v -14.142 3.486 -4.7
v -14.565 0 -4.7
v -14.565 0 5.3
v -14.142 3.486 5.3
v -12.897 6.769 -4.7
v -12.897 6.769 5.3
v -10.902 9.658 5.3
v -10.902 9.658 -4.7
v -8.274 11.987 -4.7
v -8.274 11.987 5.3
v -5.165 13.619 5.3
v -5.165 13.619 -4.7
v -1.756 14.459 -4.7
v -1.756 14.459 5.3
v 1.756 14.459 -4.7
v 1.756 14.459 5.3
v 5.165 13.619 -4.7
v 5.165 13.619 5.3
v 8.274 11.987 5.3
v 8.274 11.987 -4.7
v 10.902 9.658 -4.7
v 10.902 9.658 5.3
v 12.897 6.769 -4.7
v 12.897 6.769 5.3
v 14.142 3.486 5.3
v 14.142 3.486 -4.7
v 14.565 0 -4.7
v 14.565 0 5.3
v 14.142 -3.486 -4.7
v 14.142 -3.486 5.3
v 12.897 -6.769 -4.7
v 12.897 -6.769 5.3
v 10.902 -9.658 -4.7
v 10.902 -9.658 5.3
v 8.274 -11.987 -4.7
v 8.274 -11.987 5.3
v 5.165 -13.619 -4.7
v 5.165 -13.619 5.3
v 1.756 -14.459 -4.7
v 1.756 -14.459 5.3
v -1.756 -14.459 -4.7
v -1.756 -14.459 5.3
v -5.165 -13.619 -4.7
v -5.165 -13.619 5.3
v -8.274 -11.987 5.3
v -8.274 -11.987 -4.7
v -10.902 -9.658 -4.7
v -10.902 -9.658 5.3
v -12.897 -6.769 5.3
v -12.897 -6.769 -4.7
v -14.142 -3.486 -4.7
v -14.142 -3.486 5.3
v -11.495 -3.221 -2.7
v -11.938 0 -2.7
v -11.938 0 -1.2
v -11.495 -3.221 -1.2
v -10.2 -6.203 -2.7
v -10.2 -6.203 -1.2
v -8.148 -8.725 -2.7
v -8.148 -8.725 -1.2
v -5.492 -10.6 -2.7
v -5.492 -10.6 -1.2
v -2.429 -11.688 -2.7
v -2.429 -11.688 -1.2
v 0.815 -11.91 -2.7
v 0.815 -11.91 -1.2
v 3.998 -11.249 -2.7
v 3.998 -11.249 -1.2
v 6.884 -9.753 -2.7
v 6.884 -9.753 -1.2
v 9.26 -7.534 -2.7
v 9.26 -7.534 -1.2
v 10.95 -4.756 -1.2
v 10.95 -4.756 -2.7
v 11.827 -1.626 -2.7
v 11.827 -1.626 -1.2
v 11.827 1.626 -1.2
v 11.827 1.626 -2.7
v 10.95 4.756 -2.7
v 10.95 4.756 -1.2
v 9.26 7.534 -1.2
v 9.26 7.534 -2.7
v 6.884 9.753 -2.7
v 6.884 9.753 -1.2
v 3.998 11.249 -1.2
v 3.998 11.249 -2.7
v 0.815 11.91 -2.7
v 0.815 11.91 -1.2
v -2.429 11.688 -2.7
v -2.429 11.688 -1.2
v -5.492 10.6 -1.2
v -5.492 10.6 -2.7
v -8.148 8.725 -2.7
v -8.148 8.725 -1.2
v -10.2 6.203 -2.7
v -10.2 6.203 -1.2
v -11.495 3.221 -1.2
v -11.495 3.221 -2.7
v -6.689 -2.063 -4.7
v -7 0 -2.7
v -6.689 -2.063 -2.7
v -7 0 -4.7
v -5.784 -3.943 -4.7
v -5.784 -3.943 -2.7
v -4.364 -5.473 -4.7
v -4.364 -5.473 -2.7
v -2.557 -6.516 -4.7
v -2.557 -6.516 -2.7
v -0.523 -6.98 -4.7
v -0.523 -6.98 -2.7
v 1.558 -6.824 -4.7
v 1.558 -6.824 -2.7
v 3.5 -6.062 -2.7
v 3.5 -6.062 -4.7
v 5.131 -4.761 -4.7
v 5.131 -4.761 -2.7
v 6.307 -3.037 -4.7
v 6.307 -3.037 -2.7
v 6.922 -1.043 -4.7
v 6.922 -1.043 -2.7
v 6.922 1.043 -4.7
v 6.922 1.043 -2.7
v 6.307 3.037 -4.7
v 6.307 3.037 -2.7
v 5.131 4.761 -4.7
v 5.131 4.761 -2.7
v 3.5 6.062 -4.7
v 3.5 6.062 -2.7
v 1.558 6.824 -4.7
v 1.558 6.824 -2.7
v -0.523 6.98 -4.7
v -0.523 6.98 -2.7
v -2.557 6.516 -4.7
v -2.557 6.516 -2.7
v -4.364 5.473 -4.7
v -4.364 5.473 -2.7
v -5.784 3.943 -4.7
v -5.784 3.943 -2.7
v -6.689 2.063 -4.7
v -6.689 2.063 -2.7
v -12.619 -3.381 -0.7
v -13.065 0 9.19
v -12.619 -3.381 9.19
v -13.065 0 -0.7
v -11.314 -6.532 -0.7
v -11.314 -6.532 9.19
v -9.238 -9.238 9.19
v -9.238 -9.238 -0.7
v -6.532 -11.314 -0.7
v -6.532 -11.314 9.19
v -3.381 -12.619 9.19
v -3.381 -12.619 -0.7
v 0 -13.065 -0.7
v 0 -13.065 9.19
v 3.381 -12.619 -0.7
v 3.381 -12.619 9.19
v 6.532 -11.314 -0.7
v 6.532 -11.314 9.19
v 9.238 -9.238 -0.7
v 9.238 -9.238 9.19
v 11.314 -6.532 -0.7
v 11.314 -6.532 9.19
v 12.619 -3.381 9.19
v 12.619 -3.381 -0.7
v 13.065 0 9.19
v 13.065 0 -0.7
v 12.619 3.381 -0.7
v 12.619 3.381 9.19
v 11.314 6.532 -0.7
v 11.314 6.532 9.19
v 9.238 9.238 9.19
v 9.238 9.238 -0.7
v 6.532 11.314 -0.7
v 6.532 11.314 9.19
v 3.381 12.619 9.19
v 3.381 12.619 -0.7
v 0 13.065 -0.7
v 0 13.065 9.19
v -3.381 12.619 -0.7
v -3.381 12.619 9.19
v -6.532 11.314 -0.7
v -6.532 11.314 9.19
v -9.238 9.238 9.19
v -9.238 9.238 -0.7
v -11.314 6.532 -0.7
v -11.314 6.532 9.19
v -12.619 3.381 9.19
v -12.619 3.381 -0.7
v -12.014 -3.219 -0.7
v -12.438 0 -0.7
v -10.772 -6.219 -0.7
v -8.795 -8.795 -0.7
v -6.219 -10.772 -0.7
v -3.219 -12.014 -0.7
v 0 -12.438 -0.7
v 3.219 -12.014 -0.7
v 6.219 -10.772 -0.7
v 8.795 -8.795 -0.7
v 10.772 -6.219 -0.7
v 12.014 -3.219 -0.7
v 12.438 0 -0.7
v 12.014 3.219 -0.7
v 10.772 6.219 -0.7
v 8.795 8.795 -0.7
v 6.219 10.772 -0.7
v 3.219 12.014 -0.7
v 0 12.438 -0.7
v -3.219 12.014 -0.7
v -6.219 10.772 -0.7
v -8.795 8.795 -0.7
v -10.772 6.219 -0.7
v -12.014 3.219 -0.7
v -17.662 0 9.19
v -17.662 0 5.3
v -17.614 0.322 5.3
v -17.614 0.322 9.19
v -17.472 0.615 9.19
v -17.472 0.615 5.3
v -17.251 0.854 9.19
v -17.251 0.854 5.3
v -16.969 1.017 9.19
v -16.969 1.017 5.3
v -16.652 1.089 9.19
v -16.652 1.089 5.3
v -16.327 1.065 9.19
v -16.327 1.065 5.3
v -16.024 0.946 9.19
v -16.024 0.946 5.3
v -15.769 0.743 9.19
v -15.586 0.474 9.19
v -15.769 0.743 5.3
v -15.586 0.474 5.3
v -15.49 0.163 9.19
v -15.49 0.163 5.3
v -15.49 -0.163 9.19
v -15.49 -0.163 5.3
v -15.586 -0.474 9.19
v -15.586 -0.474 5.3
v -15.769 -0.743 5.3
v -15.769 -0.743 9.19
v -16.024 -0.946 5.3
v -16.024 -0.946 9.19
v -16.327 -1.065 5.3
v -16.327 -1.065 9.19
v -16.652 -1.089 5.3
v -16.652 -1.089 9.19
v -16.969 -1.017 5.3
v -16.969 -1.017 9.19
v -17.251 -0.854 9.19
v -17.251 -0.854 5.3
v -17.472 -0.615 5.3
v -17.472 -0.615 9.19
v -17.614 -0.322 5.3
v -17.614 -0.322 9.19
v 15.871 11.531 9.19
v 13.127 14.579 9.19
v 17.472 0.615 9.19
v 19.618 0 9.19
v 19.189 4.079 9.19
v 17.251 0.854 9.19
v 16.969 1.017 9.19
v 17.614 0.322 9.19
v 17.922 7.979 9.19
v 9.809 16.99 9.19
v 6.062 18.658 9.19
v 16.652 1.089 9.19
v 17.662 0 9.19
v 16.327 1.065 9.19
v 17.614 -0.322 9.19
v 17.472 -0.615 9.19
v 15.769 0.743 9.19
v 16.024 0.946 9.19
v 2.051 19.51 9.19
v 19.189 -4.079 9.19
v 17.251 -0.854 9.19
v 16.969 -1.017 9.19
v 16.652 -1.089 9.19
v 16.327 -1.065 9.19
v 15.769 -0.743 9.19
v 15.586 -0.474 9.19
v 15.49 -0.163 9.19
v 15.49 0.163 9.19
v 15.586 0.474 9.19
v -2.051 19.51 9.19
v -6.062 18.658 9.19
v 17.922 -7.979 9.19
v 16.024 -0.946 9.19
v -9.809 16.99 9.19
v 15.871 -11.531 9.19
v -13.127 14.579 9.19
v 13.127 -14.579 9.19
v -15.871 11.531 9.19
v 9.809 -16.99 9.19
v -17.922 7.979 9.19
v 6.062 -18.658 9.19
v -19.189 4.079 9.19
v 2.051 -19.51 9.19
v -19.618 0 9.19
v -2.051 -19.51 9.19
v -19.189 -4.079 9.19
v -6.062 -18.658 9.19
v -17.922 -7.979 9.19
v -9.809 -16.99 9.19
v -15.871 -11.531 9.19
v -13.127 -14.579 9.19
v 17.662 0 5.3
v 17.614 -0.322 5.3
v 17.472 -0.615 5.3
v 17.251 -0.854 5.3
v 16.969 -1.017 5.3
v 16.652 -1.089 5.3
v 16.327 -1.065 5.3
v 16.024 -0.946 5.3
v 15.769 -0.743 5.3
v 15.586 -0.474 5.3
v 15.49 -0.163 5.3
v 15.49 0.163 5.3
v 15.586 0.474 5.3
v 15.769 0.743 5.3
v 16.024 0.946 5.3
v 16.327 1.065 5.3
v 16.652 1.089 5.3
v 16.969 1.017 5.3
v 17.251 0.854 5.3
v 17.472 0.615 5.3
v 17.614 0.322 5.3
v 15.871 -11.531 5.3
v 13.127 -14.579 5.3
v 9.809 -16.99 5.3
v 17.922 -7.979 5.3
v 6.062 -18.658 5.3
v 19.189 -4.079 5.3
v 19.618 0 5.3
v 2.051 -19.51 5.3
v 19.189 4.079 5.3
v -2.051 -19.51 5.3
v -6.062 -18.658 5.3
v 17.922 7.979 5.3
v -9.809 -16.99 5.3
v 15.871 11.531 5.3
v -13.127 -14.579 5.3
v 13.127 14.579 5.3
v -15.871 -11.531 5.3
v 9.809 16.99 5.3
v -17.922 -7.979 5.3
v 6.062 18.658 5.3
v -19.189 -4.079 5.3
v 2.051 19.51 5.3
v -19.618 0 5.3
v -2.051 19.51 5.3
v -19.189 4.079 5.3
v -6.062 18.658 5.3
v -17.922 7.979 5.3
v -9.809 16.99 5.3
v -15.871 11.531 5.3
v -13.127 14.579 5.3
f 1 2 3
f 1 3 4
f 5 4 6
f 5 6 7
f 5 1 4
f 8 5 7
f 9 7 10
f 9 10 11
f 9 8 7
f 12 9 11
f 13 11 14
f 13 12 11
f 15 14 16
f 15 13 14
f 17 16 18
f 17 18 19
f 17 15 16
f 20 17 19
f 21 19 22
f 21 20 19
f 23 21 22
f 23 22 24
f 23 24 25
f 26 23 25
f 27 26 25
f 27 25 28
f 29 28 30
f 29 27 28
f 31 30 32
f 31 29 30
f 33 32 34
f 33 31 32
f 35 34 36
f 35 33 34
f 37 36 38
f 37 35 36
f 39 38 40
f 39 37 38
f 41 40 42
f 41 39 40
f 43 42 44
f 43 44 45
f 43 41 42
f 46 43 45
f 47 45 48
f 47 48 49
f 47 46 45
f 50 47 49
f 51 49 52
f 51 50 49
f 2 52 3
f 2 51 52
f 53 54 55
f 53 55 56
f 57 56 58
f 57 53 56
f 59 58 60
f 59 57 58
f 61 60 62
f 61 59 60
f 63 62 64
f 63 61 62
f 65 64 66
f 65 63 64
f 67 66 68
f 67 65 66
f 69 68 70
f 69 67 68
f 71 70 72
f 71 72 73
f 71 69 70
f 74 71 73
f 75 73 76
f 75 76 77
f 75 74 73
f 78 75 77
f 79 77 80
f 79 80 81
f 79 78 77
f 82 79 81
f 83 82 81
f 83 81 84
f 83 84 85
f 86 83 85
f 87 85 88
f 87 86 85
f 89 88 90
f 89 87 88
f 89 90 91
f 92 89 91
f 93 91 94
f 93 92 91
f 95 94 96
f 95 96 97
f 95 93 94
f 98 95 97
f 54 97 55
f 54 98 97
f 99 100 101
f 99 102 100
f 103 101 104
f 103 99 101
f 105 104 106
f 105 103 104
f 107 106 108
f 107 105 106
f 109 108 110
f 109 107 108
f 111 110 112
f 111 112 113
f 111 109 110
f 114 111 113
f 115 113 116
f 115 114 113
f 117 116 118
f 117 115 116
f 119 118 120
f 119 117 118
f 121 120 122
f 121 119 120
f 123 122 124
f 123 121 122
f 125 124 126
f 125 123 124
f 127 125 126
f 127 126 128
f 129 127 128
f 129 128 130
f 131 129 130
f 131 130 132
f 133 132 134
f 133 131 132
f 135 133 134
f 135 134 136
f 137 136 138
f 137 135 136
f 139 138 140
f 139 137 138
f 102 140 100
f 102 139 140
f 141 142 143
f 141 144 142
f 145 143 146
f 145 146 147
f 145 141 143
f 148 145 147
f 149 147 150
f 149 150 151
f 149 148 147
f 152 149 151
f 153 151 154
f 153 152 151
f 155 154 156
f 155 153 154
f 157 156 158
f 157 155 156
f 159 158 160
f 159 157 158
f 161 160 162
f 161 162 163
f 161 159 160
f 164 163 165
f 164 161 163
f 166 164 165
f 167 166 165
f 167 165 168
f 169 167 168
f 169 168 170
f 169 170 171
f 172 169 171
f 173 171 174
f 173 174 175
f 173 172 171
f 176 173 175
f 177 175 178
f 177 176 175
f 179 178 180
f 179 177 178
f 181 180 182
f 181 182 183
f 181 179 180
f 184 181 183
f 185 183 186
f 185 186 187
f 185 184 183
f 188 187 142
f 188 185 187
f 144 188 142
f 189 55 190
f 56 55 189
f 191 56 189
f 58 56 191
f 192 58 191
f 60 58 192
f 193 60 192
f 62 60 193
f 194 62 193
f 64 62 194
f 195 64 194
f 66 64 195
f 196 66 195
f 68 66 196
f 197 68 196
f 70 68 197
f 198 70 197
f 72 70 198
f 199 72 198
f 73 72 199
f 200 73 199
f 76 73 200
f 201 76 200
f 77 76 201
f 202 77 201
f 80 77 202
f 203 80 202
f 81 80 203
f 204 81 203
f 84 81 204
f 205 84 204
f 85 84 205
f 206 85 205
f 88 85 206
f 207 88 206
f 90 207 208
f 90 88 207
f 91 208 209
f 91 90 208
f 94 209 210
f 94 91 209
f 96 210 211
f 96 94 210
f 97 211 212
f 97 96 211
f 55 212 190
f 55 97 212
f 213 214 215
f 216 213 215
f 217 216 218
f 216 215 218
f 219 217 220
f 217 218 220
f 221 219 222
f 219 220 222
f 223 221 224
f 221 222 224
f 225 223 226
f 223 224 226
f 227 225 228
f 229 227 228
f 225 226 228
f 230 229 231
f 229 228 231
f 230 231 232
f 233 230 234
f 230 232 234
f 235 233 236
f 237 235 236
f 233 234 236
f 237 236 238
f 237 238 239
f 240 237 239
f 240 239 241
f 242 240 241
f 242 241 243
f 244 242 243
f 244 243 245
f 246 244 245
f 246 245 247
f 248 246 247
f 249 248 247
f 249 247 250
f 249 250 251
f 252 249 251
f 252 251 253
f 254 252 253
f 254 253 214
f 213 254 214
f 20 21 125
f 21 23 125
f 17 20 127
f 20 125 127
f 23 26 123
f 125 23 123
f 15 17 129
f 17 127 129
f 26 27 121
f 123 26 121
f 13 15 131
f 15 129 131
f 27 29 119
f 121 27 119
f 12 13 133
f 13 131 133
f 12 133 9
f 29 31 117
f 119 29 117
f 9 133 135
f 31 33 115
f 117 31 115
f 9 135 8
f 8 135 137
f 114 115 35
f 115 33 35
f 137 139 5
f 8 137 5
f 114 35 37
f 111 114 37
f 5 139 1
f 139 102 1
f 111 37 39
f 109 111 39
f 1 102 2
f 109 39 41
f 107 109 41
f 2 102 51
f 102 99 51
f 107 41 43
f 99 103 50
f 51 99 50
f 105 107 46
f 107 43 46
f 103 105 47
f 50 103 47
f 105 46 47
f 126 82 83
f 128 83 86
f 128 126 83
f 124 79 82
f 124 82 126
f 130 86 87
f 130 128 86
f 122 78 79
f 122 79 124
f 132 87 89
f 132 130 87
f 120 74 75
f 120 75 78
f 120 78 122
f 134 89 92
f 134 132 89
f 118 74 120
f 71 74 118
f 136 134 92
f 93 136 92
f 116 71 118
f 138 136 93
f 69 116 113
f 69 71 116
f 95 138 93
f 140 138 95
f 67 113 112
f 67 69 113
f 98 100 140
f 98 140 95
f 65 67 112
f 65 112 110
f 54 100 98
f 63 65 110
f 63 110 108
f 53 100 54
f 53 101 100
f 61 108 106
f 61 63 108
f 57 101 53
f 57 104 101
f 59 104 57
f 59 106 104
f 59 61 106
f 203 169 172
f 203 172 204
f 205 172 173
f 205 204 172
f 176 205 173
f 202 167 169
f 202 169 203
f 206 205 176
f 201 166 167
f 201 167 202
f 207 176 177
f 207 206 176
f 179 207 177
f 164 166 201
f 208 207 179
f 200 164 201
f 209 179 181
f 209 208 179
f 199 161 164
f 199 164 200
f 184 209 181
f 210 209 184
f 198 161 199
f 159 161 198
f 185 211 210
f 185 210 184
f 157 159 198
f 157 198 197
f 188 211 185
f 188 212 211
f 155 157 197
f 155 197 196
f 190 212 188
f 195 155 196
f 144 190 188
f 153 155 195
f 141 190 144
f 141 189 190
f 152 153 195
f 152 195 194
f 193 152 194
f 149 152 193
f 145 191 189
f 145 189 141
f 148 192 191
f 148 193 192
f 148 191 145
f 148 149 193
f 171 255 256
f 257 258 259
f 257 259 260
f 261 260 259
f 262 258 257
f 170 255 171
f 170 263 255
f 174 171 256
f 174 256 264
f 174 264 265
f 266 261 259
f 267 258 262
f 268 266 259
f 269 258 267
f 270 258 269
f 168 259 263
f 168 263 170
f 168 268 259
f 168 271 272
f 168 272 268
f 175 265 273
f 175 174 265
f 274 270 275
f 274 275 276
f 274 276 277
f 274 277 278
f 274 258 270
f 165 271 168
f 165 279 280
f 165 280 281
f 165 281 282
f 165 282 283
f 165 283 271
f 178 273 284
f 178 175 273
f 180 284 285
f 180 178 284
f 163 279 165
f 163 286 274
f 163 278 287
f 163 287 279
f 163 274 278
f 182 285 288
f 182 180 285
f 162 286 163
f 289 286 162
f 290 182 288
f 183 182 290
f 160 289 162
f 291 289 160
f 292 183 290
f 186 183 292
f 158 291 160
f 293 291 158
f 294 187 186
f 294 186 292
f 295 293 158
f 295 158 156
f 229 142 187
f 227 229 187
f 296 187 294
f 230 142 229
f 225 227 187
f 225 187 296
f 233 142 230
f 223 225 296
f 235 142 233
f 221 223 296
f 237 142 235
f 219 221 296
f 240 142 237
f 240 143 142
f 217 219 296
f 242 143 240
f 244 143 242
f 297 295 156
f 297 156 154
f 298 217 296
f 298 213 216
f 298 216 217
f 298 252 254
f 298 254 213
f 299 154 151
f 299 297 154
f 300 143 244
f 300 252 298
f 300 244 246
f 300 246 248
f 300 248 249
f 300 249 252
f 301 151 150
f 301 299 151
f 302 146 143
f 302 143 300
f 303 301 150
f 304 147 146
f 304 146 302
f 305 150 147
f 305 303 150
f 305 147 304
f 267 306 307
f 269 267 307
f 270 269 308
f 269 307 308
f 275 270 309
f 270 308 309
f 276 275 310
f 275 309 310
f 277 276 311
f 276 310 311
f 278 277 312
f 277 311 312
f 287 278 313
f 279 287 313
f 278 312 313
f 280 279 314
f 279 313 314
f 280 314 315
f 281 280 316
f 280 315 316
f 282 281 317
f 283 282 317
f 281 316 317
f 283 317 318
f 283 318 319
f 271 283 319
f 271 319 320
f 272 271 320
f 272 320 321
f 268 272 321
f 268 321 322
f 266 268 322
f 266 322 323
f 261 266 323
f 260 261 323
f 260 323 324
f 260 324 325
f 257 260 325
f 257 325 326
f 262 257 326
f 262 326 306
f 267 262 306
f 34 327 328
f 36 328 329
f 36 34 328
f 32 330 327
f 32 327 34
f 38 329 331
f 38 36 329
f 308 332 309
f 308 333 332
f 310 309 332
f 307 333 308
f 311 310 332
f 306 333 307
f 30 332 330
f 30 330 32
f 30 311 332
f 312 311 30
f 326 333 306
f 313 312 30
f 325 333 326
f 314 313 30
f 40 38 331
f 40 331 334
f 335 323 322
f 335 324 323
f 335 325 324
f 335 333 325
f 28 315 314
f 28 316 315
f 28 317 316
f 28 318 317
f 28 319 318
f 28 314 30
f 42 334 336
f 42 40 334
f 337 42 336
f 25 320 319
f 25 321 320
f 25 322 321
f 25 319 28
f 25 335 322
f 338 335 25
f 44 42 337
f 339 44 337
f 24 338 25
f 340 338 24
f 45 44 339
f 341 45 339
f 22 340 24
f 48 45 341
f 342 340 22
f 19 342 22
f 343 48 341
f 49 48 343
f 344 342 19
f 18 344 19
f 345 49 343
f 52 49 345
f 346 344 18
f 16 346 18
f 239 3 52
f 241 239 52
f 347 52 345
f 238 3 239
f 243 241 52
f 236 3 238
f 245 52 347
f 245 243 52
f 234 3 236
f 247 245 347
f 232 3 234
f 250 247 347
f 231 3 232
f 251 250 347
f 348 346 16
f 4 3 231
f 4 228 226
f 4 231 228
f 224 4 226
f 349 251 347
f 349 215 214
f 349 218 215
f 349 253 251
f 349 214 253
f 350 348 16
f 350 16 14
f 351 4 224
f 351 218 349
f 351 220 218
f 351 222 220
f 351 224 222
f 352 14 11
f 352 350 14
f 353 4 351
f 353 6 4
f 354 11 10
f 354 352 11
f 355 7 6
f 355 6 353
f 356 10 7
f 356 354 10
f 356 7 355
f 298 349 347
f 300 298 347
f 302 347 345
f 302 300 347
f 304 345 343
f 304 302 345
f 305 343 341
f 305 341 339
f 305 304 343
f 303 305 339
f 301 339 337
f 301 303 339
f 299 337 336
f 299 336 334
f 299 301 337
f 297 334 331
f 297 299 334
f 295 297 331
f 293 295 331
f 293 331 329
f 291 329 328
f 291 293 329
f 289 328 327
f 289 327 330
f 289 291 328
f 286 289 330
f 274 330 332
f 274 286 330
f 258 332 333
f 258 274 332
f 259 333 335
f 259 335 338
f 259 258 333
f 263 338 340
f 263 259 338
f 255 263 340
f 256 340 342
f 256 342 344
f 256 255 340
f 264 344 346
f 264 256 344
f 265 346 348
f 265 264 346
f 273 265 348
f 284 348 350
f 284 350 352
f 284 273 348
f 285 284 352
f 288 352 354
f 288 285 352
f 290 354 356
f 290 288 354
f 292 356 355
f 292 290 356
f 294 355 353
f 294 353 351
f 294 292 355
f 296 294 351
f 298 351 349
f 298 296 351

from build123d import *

# Parameters (mm, degrees)
SKETCH1_W          = 12.617819502
SKETCH1_H          = 2
SKETCH1_W_2        = 6.5532
SKETCH1_H_2        = 9.89
SKETCH2_R          = 26.652766262
SKETCH2_R_2        = 14.565
CUT_EXTRUDE1_DEPTH = 10
SKETCH4_R          = 1.0922
CUT_EXTRUDE2_DEPTH = 30.490976315
CHAMFER1_SIZE      = 0.5


with BuildPart() as part:
    # Sketch1 → Revolve1 (revolve)
    with BuildSketch(Plane(origin=(0, 0, 0), x_dir=(1, 0, 0), z_dir=(0, 1, 0))):
        with Locations((-13.308909751, 3.700473465)):
            Rectangle(SKETCH1_W, SKETCH1_H)
        Polygon((-11.938, 2.700473465), (-19.617819502, 2.700473465), (-19.617819502, 0.700473465), (-13.064619502, 0.700473465), (-11.938, 0.700473465), align=None)
        with Locations((-16.341219502, -4.244526535)):
            Rectangle(SKETCH1_W_2, SKETCH1_H_2)
    revolve(axis=Axis((0, 0, -25.411285606), (0, 0, 1)))

    # Sketch2 → Cut-Extrude1 (cut)
    with BuildSketch(Plane(origin=(0, 0, -4.700473465), x_dir=(-1, 0, 0), z_dir=(0, 0, -1))):
        Circle(SKETCH2_R)
        Circle(SKETCH2_R_2, mode=Mode.SUBTRACT)
    extrude(amount=-CUT_EXTRUDE1_DEPTH, mode=Mode.SUBTRACT)

    # Sketch4 → Cut-Extrude2 (cut, through all)
    with BuildSketch(Plane(origin=(0, 0, 5.299526535), x_dir=(-1, 0, 0), z_dir=(0, 0, -1))):
        with Locations((16.57, 0)):
            Circle(SKETCH4_R)
        with Locations(Location((-16.57, 0, 0), (0, 0, 180))):
            Circle(SKETCH4_R)
    extrude(amount=-CUT_EXTRUDE2_DEPTH, mode=Mode.SUBTRACT)

    # Chamfer1
    chamfer1_edges = [part.edges().sort_by_distance(p)[0] for p in [
        (11.938, 0, -0.700473465),
    ]]
    chamfer(chamfer1_edges, length=CHAMFER1_SIZE)


solid = part.part
